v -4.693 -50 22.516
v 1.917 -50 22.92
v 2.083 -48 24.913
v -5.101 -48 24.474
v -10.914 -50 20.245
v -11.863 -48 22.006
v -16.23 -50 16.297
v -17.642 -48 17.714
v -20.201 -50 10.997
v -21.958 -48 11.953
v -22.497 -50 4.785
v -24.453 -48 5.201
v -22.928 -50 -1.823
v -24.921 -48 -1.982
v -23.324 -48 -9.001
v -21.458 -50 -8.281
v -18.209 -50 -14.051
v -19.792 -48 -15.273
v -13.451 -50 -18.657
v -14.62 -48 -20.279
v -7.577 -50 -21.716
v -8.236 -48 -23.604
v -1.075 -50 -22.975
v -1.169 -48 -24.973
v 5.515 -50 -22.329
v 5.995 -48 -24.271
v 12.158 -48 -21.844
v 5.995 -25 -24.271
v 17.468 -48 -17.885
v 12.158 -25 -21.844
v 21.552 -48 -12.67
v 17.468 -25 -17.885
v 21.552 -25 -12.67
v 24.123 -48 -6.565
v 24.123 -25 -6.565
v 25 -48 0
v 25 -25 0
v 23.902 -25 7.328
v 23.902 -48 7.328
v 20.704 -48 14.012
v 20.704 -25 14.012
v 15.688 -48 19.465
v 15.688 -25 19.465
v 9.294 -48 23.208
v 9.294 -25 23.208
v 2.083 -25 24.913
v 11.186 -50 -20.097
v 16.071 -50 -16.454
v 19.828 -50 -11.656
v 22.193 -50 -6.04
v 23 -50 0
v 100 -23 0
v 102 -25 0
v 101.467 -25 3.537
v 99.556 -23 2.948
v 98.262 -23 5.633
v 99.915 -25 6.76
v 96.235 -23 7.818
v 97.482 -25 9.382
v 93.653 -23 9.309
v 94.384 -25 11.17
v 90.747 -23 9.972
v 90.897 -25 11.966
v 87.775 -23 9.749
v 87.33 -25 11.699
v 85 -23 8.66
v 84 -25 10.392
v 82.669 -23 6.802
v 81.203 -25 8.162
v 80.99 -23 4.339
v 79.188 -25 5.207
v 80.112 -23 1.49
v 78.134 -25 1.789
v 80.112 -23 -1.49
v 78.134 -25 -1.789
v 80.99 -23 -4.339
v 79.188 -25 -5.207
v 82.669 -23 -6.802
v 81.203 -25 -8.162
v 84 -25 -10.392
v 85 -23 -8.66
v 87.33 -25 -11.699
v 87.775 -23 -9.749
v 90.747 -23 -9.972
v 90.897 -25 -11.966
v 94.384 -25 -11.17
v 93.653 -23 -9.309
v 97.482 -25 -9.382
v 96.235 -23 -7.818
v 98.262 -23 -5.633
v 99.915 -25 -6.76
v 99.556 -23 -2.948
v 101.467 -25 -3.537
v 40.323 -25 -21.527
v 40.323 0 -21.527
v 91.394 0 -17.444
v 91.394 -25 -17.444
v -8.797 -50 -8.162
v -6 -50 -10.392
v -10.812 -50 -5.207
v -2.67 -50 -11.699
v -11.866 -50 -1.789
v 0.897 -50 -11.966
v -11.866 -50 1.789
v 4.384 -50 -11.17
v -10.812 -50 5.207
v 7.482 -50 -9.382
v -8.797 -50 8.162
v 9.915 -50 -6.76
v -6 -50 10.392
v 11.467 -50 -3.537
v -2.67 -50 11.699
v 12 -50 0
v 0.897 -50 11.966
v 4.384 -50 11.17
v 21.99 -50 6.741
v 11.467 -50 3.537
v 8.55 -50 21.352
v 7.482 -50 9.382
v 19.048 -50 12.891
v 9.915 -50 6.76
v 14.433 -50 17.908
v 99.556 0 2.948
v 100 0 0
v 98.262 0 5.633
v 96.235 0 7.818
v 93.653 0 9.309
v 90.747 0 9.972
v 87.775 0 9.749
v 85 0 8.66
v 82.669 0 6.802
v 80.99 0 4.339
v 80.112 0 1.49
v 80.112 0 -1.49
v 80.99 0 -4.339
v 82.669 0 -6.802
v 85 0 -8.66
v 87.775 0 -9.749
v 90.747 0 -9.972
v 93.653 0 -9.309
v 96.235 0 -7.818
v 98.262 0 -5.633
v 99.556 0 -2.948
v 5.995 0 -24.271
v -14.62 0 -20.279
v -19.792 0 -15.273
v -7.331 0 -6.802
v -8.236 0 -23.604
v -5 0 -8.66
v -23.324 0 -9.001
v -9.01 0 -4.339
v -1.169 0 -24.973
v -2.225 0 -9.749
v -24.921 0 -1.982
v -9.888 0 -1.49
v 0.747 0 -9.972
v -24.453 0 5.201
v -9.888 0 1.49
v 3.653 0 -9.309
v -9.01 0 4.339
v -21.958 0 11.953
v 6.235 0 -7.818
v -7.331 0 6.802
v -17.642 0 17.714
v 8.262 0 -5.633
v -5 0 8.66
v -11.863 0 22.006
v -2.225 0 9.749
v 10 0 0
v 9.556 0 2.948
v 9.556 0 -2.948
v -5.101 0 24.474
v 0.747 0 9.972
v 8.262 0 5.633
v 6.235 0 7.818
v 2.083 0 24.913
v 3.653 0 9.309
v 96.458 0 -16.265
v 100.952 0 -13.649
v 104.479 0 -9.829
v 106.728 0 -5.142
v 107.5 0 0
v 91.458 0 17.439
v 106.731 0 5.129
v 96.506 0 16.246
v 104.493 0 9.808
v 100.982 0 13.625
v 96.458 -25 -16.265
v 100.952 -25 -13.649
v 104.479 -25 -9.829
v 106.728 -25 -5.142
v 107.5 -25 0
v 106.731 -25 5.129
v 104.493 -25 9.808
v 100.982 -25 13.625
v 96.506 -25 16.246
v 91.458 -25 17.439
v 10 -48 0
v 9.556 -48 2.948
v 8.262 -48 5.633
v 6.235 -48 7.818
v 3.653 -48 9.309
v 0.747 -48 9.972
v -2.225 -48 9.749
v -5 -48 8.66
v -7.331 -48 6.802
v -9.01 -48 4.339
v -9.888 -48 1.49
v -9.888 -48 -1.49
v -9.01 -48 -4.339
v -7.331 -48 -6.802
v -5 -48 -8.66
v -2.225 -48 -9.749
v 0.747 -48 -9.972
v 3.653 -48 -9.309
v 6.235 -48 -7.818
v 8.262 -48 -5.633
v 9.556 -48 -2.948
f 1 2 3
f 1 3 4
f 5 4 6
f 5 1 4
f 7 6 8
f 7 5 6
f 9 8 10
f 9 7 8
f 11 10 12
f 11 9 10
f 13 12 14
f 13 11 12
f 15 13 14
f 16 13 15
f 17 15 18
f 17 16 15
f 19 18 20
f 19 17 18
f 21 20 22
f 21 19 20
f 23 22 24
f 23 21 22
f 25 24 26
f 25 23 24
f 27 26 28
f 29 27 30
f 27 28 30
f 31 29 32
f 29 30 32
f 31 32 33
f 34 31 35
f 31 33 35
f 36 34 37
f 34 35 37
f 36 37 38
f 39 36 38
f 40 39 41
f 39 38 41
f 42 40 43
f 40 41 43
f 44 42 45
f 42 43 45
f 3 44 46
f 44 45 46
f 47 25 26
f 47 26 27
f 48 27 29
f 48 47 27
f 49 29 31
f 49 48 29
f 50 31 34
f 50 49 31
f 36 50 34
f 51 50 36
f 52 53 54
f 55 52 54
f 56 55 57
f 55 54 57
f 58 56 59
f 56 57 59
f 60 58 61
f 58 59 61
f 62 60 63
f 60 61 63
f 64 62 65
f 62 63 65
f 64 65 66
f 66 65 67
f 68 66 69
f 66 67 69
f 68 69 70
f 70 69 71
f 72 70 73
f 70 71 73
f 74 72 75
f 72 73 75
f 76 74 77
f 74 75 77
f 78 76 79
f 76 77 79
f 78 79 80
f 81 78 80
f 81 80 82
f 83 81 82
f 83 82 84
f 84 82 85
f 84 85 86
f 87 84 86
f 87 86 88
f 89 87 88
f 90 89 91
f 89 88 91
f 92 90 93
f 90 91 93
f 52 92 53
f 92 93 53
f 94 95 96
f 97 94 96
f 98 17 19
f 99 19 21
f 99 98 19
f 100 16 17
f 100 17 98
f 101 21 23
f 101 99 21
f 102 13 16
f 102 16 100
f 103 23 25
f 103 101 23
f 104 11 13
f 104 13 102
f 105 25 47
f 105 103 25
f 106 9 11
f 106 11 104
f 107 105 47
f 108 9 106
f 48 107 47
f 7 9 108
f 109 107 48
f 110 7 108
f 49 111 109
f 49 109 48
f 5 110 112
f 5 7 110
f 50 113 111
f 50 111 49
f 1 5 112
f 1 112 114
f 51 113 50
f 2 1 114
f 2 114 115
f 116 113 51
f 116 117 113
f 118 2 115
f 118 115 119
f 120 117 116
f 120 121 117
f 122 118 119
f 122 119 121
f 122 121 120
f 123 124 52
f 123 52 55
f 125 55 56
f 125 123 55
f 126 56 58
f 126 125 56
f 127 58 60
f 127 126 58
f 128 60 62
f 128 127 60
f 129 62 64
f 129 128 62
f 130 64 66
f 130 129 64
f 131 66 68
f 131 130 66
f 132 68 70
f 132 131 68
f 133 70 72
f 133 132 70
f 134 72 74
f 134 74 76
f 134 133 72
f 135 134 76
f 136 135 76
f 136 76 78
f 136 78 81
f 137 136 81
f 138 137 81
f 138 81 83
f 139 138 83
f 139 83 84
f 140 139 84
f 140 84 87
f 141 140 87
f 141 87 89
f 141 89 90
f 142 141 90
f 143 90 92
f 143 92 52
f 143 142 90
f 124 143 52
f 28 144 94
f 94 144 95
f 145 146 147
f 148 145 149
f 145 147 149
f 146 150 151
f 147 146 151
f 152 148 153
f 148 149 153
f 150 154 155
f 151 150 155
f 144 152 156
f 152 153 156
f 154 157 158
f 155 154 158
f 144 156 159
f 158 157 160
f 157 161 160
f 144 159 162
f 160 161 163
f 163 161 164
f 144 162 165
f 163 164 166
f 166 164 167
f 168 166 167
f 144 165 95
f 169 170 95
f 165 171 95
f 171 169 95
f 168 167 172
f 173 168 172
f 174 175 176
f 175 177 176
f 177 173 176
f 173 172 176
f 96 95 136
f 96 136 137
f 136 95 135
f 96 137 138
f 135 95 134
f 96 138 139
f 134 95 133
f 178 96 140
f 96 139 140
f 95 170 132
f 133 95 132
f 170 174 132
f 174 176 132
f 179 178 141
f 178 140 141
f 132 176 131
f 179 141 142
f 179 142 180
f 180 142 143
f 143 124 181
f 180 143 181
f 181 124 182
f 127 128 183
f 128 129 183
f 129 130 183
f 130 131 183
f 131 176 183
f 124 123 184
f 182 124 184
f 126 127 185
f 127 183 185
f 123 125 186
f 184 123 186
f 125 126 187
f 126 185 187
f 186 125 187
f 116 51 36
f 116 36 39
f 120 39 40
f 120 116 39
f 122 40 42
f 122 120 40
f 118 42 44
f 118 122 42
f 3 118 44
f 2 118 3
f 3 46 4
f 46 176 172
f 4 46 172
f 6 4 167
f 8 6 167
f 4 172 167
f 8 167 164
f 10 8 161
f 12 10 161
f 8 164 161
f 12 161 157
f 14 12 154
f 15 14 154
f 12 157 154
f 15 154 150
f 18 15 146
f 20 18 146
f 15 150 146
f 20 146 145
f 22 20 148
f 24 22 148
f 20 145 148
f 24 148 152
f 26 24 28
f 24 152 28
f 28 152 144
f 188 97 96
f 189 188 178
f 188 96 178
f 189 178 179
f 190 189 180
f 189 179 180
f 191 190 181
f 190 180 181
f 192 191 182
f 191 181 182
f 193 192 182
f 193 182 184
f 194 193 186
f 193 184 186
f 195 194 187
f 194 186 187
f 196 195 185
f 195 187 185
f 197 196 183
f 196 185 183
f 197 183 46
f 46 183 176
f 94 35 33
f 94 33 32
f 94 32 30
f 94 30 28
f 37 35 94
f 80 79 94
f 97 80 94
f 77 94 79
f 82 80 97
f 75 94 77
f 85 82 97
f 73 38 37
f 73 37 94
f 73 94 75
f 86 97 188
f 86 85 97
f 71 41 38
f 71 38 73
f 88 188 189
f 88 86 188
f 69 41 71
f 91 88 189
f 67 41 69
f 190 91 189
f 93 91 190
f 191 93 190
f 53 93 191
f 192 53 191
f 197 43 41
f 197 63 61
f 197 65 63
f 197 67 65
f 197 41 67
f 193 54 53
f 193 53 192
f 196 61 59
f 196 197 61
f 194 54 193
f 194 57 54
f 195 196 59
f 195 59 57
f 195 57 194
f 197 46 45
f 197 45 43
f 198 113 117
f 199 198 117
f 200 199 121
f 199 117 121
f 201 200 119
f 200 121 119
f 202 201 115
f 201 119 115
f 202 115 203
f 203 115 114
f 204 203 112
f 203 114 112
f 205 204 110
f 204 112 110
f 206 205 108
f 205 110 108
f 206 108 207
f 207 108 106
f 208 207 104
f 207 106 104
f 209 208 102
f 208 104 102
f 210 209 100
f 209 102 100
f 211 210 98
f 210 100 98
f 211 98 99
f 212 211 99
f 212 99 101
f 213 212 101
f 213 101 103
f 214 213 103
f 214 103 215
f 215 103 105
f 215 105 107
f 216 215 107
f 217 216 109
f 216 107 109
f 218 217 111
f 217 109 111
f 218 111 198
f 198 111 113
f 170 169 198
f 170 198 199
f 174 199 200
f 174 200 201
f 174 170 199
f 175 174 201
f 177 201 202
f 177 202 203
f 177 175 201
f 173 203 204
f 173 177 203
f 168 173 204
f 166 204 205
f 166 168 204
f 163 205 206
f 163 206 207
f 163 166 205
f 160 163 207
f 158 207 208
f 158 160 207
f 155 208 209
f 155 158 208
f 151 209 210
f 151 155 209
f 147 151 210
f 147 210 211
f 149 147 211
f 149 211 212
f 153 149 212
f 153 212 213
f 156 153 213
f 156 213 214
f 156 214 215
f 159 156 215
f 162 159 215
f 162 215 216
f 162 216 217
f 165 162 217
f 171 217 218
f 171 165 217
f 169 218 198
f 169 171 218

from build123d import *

# Parameters (mm, degrees)
F0_R     = 10
F1_DEPTH = 25
F2_DEPTH = 50
F3_SIZE  = 2


with BuildPart() as f1:
    # F0 (on Front) → F1 (new body)
    with BuildSketch(Plane.XZ):
        with BuildLine():
            ThreePointArc((5.994869, -24.27059), (19.683391, -15.413116), (25, 0))
            ThreePointArc((25, 0), (18.399502, 16.92508), (2.083333, 24.913043))
            ThreePointArc((2.083333, 24.913043), (-24.921312, -1.981973), (5.994869, -24.27059))
        make_face()
        Circle(F0_R, mode=Mode.SUBTRACT)
        with BuildLine():
            ThreePointArc((2.083333, 24.913043), (18.399502, 16.92508), (25, 0))
            ThreePointArc((25, 0), (19.683391, -15.413116), (5.994869, -24.27059))
            Line((5.994869, -24.27059), (40.323092, -21.526636))
            Line((40.323092, -21.526636), (91.394378, -17.44436))
            ThreePointArc((91.394378, -17.44436), (72.500029, 0.032084), (91.458333, 17.43913))
            Line((91.458333, 17.43913), (2.083333, 24.913043))
        make_face()
        with BuildLine():
            ThreePointArc((107.5, 0), (102.879651, 11.847556), (91.458333, 17.43913))
            ThreePointArc((91.458333, 17.43913), (72.500029, 0.032084), (91.394378, -17.44436))
            ThreePointArc((91.394378, -17.44436), (102.857908, -11.87115), (107.5, 0))
        make_face()
        with Locations((90, 0)):
            Circle(F0_R, mode=Mode.SUBTRACT)
    extrude(amount=F1_DEPTH)

    # F0 (on Front) → F2 (join)
    with BuildSketch(Plane.XZ):
        with BuildLine():
            ThreePointArc((5.994869, -24.27059), (19.683391, -15.413116), (25, 0))
            ThreePointArc((25, 0), (18.399502, 16.92508), (2.083333, 24.913043))
            ThreePointArc((2.083333, 24.913043), (-24.921312, -1.981973), (5.994869, -24.27059))
        make_face()
        Circle(F0_R, mode=Mode.SUBTRACT)
    extrude(amount=F2_DEPTH)

    # F3
    f3_edges = [f1.edges().sort_by_distance(p)[0] for p in [
        (-5.994869, -50, 24.27059),
        (-10, -50, 0),
        (80, -25, 0),
    ]]
    chamfer(f3_edges, length=F3_SIZE)


solid = f1.part
